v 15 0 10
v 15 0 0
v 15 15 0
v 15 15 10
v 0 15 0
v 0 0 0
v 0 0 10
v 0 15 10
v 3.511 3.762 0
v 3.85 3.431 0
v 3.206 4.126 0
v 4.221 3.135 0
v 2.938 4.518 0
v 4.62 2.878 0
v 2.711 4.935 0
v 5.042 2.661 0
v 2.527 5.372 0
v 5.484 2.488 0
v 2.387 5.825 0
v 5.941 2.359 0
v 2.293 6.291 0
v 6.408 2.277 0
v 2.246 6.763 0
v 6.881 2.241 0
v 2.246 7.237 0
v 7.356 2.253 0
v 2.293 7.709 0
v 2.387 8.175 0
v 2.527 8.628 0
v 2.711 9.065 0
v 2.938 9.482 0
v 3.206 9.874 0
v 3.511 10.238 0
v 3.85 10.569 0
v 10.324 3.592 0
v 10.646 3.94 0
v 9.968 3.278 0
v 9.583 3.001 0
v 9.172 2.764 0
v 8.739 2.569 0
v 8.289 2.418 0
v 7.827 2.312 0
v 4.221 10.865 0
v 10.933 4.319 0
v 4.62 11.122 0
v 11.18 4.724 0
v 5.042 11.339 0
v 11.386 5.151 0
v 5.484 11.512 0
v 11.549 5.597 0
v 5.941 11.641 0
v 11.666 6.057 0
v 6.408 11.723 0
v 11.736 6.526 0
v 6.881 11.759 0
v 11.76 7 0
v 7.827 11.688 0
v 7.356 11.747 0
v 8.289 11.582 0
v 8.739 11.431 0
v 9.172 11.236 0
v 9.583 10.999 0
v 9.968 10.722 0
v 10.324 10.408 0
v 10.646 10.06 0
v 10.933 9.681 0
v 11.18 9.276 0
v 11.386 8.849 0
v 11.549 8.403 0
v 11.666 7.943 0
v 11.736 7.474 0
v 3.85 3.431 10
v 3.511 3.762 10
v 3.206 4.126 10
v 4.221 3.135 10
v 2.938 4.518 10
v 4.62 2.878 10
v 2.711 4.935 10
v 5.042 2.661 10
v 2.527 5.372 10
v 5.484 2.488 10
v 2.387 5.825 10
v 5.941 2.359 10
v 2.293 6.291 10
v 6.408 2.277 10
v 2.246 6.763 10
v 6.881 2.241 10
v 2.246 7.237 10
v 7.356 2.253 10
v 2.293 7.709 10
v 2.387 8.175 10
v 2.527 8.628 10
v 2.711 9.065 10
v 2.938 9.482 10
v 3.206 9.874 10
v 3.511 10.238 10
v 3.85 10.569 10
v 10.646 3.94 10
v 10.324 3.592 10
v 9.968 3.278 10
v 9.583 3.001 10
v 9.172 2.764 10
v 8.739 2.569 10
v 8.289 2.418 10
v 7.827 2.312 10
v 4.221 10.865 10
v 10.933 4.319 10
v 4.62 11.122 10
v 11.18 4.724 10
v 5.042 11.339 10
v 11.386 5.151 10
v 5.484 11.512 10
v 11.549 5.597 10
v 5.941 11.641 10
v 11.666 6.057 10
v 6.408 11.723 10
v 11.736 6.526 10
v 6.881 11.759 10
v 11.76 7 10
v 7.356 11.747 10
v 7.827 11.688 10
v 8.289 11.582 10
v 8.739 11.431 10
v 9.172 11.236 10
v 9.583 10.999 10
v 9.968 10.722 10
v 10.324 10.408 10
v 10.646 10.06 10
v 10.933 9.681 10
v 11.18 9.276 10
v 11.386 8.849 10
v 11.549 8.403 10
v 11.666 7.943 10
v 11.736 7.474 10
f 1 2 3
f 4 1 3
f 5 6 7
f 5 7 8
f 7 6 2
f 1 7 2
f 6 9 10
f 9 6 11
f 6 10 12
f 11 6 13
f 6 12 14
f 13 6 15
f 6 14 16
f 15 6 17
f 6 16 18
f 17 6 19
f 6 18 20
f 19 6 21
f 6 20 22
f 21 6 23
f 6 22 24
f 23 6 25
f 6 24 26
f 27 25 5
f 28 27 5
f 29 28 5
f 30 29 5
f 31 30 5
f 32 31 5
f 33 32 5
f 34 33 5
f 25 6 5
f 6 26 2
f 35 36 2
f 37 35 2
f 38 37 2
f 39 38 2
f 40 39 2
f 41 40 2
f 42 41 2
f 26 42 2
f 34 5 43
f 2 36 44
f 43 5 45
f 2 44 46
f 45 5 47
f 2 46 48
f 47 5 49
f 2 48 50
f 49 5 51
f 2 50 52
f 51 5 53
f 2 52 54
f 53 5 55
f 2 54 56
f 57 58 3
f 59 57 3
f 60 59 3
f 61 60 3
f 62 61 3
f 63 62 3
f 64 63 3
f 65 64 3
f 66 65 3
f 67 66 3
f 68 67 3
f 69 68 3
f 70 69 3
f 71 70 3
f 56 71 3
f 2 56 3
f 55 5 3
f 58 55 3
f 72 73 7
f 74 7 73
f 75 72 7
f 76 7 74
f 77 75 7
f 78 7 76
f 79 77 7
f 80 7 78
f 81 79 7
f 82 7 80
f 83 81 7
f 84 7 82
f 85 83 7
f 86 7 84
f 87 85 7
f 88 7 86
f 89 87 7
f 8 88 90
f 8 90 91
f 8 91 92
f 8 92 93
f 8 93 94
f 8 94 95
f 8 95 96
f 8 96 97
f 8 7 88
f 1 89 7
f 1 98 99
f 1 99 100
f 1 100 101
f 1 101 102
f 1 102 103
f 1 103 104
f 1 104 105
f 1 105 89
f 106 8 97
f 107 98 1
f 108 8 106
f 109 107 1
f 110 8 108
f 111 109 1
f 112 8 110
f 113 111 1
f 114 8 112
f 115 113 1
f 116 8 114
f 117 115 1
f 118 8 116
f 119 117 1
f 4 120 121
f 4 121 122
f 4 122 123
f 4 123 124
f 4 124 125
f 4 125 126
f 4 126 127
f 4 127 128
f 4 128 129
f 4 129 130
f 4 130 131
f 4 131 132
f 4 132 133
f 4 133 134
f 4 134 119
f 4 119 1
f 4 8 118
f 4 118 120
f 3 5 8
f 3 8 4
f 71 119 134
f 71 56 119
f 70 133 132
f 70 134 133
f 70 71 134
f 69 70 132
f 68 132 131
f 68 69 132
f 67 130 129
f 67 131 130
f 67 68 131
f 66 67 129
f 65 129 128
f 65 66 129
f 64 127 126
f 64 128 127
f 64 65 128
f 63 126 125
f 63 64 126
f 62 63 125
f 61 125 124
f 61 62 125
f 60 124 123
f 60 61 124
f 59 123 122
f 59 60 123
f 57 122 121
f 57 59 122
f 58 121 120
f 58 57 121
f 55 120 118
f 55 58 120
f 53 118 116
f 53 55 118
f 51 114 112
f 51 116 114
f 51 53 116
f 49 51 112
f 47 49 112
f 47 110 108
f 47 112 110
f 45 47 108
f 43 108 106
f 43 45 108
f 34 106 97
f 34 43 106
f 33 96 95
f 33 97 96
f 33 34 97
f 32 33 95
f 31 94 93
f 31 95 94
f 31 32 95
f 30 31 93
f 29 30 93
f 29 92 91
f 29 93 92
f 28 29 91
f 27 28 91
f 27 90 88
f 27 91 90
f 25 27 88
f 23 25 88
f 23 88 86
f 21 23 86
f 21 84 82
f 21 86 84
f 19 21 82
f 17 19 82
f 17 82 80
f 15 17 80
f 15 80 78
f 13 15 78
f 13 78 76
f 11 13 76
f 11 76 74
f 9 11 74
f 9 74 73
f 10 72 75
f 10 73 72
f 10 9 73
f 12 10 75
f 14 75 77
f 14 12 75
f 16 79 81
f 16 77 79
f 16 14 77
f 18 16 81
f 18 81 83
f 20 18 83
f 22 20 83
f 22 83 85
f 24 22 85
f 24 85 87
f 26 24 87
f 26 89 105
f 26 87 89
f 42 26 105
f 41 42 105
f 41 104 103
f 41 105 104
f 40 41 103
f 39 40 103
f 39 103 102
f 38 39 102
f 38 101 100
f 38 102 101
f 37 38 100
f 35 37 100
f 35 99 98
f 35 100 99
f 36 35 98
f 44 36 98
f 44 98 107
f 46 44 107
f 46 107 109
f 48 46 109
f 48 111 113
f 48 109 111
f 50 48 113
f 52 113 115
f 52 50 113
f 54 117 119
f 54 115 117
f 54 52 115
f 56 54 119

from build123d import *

# Parameters (mm, degrees)
CYLINDER_R     = 4.76
CYLINDER_DEPTH = 15
BOX_W          = 15
BOX_H          = 15
BOX_DEPTH      = 10


with BuildPart() as cylinder:
    # Cylinder → Cylinder (new body)
    with BuildSketch(Plane(origin=(7, 7, -3), x_dir=(1, 0, 0), z_dir=(0, 0, 1))):
        Circle(CYLINDER_R)
    extrude(amount=CYLINDER_DEPTH)


with BuildPart() as cut:
    # Box → Box (new body)
    with BuildSketch(Plane.XY):
        with Locations((7.5, 7.5)):
            Rectangle(BOX_W, BOX_H)
    extrude(amount=BOX_DEPTH)

    # Cut: cut Cylinder
    add(cylinder.part, mode=Mode.SUBTRACT)


solid = cut.part
